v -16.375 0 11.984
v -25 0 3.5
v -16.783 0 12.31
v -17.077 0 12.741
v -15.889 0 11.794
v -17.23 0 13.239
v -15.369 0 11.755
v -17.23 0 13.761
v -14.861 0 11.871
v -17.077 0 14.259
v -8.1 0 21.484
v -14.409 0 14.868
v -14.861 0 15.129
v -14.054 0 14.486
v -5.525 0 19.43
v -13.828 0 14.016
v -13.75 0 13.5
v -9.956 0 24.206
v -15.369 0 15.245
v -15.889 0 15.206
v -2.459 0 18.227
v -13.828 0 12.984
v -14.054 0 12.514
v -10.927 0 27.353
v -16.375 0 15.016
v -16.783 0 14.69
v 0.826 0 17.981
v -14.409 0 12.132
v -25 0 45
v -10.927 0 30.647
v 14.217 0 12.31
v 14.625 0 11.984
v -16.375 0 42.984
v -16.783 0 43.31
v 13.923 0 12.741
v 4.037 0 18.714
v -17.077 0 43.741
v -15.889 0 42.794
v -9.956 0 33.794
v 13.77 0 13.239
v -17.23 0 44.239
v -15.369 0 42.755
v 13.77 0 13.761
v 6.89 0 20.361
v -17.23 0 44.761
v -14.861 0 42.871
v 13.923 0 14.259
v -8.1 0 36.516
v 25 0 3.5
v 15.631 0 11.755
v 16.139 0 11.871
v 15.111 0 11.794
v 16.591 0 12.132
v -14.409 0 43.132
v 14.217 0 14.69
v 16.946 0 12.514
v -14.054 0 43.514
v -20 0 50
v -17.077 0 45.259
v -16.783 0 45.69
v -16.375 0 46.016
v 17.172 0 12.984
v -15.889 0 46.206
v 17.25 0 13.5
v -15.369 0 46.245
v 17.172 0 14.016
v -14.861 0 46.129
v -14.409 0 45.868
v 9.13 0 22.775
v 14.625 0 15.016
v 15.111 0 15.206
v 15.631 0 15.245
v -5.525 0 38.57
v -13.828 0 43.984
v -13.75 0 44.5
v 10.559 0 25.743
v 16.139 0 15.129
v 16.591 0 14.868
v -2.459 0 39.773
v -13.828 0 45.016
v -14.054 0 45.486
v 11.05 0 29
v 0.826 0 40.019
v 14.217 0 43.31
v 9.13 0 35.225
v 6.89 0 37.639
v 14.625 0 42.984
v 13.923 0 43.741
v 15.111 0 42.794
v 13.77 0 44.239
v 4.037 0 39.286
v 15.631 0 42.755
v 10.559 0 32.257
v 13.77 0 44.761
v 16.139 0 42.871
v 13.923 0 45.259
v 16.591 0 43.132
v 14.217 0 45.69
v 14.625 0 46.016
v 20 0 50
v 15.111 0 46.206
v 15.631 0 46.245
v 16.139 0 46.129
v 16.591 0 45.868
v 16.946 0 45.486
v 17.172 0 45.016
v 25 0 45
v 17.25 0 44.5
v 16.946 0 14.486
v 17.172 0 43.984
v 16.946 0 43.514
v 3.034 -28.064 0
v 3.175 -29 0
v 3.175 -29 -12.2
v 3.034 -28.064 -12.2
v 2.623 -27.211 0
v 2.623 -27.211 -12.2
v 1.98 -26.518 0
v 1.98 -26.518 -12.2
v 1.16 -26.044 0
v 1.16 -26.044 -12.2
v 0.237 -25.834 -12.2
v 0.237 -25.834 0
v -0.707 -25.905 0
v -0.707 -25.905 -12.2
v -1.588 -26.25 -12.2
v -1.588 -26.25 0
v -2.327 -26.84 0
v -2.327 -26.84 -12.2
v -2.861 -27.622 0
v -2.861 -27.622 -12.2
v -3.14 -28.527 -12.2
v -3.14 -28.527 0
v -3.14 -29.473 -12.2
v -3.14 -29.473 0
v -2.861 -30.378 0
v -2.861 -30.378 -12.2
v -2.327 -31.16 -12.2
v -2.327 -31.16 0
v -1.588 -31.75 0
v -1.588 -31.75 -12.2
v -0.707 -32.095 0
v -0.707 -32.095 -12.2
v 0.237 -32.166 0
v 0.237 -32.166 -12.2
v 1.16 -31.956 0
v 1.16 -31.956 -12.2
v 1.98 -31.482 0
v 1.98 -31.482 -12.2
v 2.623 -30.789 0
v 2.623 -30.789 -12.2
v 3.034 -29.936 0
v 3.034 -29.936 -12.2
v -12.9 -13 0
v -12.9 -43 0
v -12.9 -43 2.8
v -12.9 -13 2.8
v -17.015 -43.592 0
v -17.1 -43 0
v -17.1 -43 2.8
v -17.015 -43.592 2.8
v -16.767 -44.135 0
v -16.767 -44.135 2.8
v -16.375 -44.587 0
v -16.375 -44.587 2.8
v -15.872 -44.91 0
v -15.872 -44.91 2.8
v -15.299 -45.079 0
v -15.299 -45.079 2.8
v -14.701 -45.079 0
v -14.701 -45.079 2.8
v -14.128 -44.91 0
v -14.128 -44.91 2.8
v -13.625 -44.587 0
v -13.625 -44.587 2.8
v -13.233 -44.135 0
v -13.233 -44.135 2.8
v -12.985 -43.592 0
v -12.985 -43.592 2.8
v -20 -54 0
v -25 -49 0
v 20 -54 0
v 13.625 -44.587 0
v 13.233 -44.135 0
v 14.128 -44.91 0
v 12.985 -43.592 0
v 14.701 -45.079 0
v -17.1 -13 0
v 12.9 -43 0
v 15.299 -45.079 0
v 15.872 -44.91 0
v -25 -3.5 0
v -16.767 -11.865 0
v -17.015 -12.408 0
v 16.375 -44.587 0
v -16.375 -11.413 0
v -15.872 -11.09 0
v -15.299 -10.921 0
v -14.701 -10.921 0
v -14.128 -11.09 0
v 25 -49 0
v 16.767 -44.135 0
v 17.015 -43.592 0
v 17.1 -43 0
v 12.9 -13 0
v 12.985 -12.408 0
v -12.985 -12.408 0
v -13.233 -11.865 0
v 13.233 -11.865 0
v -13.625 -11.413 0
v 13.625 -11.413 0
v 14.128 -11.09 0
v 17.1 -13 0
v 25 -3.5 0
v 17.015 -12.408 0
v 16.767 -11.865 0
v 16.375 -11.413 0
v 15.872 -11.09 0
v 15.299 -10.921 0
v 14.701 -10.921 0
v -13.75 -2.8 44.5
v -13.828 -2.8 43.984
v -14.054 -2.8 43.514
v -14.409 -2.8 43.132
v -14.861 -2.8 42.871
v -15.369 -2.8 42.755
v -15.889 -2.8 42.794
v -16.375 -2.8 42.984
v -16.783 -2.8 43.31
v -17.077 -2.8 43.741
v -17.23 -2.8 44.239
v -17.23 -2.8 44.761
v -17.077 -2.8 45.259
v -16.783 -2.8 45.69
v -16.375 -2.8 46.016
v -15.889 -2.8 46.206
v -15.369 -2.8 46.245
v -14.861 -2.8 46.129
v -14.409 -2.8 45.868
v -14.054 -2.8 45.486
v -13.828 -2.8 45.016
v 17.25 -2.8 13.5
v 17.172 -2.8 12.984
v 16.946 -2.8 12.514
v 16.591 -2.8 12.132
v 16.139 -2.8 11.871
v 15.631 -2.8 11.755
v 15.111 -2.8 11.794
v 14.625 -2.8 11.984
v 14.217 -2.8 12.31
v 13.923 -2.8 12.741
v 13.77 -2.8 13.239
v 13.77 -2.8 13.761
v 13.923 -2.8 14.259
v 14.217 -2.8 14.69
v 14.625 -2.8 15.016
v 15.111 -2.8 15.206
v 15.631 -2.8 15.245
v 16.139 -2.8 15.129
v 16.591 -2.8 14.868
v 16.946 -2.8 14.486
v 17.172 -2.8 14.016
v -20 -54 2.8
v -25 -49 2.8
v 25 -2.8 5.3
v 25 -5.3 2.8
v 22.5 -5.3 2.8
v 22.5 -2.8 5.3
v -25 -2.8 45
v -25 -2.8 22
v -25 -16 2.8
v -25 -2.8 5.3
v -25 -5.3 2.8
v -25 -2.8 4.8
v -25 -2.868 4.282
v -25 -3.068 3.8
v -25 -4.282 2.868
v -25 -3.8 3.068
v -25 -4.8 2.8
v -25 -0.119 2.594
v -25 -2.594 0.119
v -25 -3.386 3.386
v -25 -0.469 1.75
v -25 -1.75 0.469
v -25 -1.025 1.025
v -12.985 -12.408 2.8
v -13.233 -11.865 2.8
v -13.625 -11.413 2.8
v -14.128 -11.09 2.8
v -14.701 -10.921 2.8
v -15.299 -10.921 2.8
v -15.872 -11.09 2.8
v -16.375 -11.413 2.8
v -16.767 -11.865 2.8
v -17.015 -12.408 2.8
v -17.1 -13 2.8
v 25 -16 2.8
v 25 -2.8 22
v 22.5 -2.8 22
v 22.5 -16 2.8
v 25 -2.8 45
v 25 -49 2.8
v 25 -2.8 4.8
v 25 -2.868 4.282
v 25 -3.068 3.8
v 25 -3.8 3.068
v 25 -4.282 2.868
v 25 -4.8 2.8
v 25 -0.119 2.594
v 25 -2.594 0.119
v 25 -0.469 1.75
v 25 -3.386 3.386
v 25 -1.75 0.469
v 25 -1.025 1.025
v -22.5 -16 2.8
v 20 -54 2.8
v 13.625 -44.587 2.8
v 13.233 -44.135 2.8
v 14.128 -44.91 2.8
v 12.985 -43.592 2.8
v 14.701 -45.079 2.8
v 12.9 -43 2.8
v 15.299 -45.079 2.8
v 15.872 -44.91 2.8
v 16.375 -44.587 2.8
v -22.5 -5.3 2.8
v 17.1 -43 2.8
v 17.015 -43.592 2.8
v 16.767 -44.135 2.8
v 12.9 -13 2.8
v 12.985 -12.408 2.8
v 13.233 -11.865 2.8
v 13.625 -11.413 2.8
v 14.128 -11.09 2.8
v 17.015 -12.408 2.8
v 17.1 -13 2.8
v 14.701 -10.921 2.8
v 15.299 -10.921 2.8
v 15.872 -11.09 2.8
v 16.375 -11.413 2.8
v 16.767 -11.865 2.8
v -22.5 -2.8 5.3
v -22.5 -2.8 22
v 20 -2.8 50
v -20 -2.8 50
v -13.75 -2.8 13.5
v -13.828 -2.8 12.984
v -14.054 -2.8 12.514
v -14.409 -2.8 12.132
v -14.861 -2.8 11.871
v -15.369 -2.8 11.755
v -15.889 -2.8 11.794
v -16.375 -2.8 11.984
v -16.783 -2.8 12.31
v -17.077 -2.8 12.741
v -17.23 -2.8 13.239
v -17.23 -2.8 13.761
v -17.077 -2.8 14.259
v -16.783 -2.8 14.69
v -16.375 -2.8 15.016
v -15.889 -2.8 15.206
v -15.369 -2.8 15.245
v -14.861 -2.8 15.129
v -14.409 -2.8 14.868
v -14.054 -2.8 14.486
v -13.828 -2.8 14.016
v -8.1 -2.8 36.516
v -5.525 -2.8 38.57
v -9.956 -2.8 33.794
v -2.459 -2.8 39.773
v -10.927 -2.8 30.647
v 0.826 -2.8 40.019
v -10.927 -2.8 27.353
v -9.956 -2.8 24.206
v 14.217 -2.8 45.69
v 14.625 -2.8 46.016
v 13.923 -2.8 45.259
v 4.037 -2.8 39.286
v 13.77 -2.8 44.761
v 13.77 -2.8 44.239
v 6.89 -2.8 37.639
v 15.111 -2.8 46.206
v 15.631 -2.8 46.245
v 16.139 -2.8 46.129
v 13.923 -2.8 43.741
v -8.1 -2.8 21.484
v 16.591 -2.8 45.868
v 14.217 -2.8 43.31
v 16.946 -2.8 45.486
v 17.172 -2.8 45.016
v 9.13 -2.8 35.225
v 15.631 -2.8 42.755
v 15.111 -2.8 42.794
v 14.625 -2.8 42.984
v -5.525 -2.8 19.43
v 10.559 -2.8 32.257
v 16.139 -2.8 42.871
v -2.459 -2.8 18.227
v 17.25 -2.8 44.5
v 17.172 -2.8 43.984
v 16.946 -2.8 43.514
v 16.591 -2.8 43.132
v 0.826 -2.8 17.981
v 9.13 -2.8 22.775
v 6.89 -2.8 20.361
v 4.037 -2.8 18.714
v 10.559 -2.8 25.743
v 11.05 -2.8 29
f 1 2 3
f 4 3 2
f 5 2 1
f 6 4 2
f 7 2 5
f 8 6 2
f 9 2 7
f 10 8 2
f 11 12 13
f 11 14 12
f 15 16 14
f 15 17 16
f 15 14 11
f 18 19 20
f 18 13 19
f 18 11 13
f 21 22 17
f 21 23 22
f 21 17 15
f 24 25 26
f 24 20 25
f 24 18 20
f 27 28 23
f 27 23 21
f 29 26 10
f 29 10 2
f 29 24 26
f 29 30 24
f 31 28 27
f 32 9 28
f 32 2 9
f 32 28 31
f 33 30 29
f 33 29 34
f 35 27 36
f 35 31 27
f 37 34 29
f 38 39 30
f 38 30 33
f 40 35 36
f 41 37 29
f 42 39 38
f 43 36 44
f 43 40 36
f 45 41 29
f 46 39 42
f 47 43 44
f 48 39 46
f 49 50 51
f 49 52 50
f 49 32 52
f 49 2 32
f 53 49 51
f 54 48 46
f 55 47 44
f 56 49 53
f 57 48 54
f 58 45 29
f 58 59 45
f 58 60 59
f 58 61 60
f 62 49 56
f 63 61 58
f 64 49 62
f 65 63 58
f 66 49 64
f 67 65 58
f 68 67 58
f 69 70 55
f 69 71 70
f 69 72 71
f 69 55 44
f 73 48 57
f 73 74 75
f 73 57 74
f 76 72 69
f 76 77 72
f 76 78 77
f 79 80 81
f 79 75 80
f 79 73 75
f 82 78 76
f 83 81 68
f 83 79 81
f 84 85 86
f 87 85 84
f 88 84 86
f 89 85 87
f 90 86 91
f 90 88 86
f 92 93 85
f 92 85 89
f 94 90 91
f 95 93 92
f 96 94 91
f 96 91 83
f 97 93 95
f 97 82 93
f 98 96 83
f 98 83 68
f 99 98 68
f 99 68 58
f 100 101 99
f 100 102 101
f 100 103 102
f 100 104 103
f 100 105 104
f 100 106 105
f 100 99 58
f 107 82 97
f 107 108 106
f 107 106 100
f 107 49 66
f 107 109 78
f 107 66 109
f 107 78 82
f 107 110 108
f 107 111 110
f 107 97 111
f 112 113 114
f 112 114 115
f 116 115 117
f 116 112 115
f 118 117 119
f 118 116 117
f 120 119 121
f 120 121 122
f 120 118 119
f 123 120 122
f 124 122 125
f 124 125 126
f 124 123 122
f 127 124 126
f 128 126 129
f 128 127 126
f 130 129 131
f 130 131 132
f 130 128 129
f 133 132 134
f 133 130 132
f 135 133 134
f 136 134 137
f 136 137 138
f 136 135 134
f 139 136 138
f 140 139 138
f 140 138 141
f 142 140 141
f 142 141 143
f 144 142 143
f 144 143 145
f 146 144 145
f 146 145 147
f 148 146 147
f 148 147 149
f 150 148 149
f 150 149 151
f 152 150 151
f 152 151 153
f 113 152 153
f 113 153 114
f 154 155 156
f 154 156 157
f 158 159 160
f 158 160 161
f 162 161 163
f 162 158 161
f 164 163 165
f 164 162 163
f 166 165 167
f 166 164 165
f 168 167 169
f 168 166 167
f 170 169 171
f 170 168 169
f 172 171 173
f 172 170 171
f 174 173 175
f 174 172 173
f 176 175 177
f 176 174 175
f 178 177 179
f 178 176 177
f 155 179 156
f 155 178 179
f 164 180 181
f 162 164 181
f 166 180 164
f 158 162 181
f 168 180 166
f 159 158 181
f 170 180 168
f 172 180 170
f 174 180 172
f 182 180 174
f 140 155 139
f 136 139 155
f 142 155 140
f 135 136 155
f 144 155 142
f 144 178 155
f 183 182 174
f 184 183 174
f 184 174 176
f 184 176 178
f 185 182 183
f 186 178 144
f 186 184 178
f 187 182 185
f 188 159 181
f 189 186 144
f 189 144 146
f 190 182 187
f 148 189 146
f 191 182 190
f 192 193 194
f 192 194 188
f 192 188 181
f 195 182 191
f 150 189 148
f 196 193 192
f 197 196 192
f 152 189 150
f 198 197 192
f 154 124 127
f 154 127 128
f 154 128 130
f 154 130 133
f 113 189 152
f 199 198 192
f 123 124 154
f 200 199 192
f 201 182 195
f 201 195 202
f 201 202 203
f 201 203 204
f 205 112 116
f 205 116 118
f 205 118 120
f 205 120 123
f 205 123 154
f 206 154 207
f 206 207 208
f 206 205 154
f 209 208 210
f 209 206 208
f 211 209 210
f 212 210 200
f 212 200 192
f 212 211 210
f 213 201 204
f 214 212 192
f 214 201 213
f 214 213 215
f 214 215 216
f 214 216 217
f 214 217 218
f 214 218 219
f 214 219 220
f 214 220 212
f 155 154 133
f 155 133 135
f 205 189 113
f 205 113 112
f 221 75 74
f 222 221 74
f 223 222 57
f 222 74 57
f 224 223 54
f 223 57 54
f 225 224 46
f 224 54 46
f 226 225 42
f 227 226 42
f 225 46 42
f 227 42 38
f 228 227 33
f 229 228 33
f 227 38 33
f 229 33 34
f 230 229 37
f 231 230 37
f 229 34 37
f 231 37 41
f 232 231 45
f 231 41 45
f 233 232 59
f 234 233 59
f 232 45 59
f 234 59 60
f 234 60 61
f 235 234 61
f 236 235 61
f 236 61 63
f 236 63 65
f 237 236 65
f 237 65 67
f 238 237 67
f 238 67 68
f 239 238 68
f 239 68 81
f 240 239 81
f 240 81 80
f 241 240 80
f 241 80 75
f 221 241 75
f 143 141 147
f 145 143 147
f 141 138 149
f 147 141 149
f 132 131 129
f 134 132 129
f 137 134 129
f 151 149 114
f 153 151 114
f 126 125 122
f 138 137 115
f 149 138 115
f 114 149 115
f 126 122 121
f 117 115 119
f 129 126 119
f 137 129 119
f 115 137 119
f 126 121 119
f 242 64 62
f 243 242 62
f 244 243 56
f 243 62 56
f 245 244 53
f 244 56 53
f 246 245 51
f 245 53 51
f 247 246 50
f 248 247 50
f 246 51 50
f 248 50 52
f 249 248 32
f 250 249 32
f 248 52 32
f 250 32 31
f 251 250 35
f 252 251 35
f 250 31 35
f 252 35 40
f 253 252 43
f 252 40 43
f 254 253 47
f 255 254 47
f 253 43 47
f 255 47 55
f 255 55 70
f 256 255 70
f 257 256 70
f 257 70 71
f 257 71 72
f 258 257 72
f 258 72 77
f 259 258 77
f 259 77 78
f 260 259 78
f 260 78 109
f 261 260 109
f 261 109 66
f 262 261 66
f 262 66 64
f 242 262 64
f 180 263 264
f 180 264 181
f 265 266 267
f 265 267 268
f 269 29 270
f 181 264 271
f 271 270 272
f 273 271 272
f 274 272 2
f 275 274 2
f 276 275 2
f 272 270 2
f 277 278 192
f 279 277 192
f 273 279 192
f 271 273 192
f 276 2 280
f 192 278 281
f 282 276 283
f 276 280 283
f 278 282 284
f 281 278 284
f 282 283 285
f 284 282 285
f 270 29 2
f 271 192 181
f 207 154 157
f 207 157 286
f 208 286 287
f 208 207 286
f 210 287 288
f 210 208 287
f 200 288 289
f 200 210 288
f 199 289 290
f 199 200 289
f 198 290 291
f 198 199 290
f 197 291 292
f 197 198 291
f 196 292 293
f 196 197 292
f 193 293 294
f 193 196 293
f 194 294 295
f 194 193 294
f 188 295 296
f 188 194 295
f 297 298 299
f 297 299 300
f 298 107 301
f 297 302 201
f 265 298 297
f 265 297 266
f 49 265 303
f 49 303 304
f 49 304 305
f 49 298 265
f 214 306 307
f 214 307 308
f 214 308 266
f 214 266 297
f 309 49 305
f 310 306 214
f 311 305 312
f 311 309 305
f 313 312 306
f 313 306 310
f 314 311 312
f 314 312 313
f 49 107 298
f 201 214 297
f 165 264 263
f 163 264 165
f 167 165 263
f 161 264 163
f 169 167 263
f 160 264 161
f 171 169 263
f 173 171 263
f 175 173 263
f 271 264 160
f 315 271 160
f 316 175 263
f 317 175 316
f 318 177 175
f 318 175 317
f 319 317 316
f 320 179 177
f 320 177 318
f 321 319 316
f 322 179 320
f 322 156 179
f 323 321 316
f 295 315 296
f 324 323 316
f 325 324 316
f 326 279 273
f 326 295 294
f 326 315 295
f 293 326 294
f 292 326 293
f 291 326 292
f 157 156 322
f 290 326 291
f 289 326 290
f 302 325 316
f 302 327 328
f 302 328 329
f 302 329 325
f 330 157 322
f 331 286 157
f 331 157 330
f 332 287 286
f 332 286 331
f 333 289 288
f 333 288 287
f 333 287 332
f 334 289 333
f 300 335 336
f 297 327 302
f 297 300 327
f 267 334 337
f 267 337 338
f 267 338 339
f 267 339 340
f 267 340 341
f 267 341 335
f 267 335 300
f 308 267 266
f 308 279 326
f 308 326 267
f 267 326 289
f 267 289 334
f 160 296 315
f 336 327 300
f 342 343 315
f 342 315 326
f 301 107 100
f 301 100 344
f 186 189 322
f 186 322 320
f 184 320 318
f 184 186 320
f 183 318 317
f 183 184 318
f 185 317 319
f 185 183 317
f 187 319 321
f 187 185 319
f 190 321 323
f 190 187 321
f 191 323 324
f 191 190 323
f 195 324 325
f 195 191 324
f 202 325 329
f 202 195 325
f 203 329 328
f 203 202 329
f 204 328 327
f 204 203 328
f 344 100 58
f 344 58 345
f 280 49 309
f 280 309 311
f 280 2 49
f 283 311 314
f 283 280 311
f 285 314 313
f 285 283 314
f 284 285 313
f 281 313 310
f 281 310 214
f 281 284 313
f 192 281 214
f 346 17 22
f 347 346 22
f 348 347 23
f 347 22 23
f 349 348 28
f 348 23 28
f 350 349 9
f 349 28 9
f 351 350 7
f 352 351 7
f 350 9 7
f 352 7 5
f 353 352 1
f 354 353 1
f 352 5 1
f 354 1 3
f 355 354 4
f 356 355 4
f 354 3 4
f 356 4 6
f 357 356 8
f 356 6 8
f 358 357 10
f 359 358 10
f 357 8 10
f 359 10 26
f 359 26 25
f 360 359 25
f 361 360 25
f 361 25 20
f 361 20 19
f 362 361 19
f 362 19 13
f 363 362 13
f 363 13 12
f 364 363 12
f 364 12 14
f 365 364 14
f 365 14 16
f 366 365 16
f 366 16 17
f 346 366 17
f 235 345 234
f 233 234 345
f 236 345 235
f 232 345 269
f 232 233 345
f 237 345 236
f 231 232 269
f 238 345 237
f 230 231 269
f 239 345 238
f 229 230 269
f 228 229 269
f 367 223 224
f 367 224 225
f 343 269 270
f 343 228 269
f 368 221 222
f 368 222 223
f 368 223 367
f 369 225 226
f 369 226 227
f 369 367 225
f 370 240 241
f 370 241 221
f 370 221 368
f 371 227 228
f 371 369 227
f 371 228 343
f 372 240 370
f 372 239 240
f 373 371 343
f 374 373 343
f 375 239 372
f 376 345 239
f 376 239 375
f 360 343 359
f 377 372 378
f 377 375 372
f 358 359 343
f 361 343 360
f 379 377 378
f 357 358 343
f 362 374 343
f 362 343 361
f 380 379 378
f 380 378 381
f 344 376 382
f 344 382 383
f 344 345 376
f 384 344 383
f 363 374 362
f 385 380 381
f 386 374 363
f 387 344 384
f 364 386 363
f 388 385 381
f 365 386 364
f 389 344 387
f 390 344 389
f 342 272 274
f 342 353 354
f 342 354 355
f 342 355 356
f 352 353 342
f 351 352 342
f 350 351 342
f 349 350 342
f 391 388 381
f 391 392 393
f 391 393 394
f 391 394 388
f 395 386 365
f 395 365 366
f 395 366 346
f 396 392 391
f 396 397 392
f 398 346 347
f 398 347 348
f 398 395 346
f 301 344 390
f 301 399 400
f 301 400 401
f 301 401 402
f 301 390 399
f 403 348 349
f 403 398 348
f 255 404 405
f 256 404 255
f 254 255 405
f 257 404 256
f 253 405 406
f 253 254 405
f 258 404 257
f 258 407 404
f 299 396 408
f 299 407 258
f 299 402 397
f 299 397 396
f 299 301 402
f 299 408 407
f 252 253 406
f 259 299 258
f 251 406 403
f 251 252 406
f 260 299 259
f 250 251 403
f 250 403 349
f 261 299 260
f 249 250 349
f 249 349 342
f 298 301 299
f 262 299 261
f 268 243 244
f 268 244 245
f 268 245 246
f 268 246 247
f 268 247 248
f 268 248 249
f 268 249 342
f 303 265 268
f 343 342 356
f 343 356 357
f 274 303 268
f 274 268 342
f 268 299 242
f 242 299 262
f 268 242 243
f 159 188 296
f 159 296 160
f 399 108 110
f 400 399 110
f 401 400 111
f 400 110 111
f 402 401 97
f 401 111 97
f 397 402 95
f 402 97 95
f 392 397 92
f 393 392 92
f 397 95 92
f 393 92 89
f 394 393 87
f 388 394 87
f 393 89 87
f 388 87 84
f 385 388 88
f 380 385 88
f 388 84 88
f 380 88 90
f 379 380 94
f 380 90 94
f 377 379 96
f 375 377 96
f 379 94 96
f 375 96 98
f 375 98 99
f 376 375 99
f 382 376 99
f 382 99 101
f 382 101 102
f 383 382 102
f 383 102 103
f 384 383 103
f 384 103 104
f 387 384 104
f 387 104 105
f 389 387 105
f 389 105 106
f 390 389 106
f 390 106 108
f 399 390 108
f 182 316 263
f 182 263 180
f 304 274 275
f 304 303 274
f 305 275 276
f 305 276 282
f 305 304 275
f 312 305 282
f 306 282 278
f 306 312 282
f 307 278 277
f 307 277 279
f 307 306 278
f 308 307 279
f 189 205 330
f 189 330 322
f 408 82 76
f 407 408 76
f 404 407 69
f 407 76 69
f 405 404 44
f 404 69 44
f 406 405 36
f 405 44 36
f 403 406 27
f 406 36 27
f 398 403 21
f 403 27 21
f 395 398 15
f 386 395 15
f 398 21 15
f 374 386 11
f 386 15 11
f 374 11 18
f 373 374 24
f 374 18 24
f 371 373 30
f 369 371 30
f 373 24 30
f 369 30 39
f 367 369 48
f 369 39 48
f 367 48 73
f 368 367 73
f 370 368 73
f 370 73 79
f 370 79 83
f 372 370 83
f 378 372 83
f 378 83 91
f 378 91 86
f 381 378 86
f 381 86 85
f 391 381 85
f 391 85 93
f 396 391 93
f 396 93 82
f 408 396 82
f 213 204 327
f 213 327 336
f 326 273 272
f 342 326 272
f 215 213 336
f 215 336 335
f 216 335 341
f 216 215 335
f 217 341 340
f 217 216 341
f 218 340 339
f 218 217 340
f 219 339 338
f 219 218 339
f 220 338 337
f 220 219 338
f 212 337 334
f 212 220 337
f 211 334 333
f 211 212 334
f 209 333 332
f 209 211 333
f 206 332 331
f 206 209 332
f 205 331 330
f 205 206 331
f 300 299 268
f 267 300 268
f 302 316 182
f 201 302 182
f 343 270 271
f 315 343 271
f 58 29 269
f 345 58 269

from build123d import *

# Parameters (mm, degrees)
BOSS_EXTRUDE1_DEPTH      = 25
BOSS_EXTRUDE1_DEPTH_BACK = 25
SKETCH3_R                = 11.05
SKETCH3_R_2              = 1.75
CUT_EXTRUDE1_DEPTH       = 78.723870207
CUT_EXTRUDE2_DEPTH       = 78.723870207
CHAMFER1_SIZE            = 5
FILLET1_R                = 2
FILLET2_R                = 3.5
BOSS_EXTRUDE2_DEPTH      = 2.5
SKETCH6_R                = 3.175
BOSS_EXTRUDE3_DEPTH      = 15


with BuildPart() as part:
    # Sketch1 → Boss-Extrude1 (new, two sides: drawn at the far end of the back side and taken through both)
    with BuildSketch(Plane(origin=(0, 0, 0), x_dir=(0, 0, -1), z_dir=(1, 0, 0)).offset(-BOSS_EXTRUDE1_DEPTH_BACK)):
        Polygon((-50, 0), (-50, -2.8), (-2.8, -2.8), (-2.8, -54), (0, -54), (0, 0), align=None)
    extrude(amount=BOSS_EXTRUDE1_DEPTH + BOSS_EXTRUDE1_DEPTH_BACK)

    # Sketch3 → Cut-Extrude1 (cut, through all)
    with BuildSketch(Plane(origin=(0, 0, 0), x_dir=(1, 0, 0), z_dir=(0, 1, 0))):
        with Locations((0, -29)):
            Circle(SKETCH3_R)
        with Locations((-15.5, -13.5)):
            Circle(SKETCH3_R_2)
        with Locations((15.5, -13.5)):
            Circle(SKETCH3_R_2)
        with Locations((15.5, -44.5)):
            Circle(SKETCH3_R_2)
        with Locations((-15.5, -44.5)):
            Circle(SKETCH3_R_2)
    extrude(amount=-CUT_EXTRUDE1_DEPTH, mode=Mode.SUBTRACT)

    # Sketch4 → Cut-Extrude2 (cut, through all)
    with BuildSketch(Plane(origin=(0, 0, 0), x_dir=(-1, 0, 0), z_dir=(0, 0, -1))):
        with BuildLine():
            Line((-17.1, -43), (-17.1, -13))
            ThreePointArc((-17.1, -13), (-15, -10.9), (-12.9, -13))
            Line((-12.9, -13), (-12.9, -43))
            ThreePointArc((-12.9, -43), (-15, -45.1), (-17.1, -43))
        make_face()
        with BuildLine():
            Line((12.9, -43), (12.9, -13))
            ThreePointArc((12.9, -13), (15, -10.9), (17.1, -13))
            Line((17.1, -13), (17.1, -43))
            ThreePointArc((17.1, -43), (15, -45.1), (12.9, -43))
        make_face()
    extrude(amount=-CUT_EXTRUDE2_DEPTH, mode=Mode.SUBTRACT)

    # Chamfer1
    chamfer1_edges = [part.edges().sort_by_distance(p)[0] for p in [
        (25, -54, 1.4),
        (-25, -54, 1.4),
        (-25, -1.4, 50),
        (25, -1.4, 50),
    ]]
    chamfer(chamfer1_edges, length=CHAMFER1_SIZE)

    # Fillet1
    fillet1_edges = [part.edges().sort_by_distance(p)[0] for p in [
        (0, -2.8, 2.8),
    ]]
    fillet(fillet1_edges, radius=FILLET1_R)

    # Fillet2
    fillet2_edges = [part.edges().sort_by_distance(p)[0] for p in [
        (0, 0, 0),
    ]]
    fillet(fillet2_edges, radius=FILLET2_R)

    # Sketch5 → Boss-Extrude2 (add)
    with BuildSketch(Plane.ZY.offset(25)):
        Polygon((2.8, -5.3), (5.3, -2.8), (22, -2.8), (2.8, -16), align=None)
    boss_extrude2 = extrude(amount=-BOSS_EXTRUDE2_DEPTH)

    # Mirror1: Boss-Extrude2 across plane
    add(boss_extrude2.mirror(Plane(origin=(0, 0, 0), x_dir=(0, 0, 1), z_dir=(1, 0, 0))))

    # Sketch6 → Boss-Extrude3 (add)
    with BuildSketch(Plane.XY.offset(2.8)):
        with Locations((0, -29)):
            Circle(SKETCH6_R)
    extrude(amount=-BOSS_EXTRUDE3_DEPTH)


solid = part.part
